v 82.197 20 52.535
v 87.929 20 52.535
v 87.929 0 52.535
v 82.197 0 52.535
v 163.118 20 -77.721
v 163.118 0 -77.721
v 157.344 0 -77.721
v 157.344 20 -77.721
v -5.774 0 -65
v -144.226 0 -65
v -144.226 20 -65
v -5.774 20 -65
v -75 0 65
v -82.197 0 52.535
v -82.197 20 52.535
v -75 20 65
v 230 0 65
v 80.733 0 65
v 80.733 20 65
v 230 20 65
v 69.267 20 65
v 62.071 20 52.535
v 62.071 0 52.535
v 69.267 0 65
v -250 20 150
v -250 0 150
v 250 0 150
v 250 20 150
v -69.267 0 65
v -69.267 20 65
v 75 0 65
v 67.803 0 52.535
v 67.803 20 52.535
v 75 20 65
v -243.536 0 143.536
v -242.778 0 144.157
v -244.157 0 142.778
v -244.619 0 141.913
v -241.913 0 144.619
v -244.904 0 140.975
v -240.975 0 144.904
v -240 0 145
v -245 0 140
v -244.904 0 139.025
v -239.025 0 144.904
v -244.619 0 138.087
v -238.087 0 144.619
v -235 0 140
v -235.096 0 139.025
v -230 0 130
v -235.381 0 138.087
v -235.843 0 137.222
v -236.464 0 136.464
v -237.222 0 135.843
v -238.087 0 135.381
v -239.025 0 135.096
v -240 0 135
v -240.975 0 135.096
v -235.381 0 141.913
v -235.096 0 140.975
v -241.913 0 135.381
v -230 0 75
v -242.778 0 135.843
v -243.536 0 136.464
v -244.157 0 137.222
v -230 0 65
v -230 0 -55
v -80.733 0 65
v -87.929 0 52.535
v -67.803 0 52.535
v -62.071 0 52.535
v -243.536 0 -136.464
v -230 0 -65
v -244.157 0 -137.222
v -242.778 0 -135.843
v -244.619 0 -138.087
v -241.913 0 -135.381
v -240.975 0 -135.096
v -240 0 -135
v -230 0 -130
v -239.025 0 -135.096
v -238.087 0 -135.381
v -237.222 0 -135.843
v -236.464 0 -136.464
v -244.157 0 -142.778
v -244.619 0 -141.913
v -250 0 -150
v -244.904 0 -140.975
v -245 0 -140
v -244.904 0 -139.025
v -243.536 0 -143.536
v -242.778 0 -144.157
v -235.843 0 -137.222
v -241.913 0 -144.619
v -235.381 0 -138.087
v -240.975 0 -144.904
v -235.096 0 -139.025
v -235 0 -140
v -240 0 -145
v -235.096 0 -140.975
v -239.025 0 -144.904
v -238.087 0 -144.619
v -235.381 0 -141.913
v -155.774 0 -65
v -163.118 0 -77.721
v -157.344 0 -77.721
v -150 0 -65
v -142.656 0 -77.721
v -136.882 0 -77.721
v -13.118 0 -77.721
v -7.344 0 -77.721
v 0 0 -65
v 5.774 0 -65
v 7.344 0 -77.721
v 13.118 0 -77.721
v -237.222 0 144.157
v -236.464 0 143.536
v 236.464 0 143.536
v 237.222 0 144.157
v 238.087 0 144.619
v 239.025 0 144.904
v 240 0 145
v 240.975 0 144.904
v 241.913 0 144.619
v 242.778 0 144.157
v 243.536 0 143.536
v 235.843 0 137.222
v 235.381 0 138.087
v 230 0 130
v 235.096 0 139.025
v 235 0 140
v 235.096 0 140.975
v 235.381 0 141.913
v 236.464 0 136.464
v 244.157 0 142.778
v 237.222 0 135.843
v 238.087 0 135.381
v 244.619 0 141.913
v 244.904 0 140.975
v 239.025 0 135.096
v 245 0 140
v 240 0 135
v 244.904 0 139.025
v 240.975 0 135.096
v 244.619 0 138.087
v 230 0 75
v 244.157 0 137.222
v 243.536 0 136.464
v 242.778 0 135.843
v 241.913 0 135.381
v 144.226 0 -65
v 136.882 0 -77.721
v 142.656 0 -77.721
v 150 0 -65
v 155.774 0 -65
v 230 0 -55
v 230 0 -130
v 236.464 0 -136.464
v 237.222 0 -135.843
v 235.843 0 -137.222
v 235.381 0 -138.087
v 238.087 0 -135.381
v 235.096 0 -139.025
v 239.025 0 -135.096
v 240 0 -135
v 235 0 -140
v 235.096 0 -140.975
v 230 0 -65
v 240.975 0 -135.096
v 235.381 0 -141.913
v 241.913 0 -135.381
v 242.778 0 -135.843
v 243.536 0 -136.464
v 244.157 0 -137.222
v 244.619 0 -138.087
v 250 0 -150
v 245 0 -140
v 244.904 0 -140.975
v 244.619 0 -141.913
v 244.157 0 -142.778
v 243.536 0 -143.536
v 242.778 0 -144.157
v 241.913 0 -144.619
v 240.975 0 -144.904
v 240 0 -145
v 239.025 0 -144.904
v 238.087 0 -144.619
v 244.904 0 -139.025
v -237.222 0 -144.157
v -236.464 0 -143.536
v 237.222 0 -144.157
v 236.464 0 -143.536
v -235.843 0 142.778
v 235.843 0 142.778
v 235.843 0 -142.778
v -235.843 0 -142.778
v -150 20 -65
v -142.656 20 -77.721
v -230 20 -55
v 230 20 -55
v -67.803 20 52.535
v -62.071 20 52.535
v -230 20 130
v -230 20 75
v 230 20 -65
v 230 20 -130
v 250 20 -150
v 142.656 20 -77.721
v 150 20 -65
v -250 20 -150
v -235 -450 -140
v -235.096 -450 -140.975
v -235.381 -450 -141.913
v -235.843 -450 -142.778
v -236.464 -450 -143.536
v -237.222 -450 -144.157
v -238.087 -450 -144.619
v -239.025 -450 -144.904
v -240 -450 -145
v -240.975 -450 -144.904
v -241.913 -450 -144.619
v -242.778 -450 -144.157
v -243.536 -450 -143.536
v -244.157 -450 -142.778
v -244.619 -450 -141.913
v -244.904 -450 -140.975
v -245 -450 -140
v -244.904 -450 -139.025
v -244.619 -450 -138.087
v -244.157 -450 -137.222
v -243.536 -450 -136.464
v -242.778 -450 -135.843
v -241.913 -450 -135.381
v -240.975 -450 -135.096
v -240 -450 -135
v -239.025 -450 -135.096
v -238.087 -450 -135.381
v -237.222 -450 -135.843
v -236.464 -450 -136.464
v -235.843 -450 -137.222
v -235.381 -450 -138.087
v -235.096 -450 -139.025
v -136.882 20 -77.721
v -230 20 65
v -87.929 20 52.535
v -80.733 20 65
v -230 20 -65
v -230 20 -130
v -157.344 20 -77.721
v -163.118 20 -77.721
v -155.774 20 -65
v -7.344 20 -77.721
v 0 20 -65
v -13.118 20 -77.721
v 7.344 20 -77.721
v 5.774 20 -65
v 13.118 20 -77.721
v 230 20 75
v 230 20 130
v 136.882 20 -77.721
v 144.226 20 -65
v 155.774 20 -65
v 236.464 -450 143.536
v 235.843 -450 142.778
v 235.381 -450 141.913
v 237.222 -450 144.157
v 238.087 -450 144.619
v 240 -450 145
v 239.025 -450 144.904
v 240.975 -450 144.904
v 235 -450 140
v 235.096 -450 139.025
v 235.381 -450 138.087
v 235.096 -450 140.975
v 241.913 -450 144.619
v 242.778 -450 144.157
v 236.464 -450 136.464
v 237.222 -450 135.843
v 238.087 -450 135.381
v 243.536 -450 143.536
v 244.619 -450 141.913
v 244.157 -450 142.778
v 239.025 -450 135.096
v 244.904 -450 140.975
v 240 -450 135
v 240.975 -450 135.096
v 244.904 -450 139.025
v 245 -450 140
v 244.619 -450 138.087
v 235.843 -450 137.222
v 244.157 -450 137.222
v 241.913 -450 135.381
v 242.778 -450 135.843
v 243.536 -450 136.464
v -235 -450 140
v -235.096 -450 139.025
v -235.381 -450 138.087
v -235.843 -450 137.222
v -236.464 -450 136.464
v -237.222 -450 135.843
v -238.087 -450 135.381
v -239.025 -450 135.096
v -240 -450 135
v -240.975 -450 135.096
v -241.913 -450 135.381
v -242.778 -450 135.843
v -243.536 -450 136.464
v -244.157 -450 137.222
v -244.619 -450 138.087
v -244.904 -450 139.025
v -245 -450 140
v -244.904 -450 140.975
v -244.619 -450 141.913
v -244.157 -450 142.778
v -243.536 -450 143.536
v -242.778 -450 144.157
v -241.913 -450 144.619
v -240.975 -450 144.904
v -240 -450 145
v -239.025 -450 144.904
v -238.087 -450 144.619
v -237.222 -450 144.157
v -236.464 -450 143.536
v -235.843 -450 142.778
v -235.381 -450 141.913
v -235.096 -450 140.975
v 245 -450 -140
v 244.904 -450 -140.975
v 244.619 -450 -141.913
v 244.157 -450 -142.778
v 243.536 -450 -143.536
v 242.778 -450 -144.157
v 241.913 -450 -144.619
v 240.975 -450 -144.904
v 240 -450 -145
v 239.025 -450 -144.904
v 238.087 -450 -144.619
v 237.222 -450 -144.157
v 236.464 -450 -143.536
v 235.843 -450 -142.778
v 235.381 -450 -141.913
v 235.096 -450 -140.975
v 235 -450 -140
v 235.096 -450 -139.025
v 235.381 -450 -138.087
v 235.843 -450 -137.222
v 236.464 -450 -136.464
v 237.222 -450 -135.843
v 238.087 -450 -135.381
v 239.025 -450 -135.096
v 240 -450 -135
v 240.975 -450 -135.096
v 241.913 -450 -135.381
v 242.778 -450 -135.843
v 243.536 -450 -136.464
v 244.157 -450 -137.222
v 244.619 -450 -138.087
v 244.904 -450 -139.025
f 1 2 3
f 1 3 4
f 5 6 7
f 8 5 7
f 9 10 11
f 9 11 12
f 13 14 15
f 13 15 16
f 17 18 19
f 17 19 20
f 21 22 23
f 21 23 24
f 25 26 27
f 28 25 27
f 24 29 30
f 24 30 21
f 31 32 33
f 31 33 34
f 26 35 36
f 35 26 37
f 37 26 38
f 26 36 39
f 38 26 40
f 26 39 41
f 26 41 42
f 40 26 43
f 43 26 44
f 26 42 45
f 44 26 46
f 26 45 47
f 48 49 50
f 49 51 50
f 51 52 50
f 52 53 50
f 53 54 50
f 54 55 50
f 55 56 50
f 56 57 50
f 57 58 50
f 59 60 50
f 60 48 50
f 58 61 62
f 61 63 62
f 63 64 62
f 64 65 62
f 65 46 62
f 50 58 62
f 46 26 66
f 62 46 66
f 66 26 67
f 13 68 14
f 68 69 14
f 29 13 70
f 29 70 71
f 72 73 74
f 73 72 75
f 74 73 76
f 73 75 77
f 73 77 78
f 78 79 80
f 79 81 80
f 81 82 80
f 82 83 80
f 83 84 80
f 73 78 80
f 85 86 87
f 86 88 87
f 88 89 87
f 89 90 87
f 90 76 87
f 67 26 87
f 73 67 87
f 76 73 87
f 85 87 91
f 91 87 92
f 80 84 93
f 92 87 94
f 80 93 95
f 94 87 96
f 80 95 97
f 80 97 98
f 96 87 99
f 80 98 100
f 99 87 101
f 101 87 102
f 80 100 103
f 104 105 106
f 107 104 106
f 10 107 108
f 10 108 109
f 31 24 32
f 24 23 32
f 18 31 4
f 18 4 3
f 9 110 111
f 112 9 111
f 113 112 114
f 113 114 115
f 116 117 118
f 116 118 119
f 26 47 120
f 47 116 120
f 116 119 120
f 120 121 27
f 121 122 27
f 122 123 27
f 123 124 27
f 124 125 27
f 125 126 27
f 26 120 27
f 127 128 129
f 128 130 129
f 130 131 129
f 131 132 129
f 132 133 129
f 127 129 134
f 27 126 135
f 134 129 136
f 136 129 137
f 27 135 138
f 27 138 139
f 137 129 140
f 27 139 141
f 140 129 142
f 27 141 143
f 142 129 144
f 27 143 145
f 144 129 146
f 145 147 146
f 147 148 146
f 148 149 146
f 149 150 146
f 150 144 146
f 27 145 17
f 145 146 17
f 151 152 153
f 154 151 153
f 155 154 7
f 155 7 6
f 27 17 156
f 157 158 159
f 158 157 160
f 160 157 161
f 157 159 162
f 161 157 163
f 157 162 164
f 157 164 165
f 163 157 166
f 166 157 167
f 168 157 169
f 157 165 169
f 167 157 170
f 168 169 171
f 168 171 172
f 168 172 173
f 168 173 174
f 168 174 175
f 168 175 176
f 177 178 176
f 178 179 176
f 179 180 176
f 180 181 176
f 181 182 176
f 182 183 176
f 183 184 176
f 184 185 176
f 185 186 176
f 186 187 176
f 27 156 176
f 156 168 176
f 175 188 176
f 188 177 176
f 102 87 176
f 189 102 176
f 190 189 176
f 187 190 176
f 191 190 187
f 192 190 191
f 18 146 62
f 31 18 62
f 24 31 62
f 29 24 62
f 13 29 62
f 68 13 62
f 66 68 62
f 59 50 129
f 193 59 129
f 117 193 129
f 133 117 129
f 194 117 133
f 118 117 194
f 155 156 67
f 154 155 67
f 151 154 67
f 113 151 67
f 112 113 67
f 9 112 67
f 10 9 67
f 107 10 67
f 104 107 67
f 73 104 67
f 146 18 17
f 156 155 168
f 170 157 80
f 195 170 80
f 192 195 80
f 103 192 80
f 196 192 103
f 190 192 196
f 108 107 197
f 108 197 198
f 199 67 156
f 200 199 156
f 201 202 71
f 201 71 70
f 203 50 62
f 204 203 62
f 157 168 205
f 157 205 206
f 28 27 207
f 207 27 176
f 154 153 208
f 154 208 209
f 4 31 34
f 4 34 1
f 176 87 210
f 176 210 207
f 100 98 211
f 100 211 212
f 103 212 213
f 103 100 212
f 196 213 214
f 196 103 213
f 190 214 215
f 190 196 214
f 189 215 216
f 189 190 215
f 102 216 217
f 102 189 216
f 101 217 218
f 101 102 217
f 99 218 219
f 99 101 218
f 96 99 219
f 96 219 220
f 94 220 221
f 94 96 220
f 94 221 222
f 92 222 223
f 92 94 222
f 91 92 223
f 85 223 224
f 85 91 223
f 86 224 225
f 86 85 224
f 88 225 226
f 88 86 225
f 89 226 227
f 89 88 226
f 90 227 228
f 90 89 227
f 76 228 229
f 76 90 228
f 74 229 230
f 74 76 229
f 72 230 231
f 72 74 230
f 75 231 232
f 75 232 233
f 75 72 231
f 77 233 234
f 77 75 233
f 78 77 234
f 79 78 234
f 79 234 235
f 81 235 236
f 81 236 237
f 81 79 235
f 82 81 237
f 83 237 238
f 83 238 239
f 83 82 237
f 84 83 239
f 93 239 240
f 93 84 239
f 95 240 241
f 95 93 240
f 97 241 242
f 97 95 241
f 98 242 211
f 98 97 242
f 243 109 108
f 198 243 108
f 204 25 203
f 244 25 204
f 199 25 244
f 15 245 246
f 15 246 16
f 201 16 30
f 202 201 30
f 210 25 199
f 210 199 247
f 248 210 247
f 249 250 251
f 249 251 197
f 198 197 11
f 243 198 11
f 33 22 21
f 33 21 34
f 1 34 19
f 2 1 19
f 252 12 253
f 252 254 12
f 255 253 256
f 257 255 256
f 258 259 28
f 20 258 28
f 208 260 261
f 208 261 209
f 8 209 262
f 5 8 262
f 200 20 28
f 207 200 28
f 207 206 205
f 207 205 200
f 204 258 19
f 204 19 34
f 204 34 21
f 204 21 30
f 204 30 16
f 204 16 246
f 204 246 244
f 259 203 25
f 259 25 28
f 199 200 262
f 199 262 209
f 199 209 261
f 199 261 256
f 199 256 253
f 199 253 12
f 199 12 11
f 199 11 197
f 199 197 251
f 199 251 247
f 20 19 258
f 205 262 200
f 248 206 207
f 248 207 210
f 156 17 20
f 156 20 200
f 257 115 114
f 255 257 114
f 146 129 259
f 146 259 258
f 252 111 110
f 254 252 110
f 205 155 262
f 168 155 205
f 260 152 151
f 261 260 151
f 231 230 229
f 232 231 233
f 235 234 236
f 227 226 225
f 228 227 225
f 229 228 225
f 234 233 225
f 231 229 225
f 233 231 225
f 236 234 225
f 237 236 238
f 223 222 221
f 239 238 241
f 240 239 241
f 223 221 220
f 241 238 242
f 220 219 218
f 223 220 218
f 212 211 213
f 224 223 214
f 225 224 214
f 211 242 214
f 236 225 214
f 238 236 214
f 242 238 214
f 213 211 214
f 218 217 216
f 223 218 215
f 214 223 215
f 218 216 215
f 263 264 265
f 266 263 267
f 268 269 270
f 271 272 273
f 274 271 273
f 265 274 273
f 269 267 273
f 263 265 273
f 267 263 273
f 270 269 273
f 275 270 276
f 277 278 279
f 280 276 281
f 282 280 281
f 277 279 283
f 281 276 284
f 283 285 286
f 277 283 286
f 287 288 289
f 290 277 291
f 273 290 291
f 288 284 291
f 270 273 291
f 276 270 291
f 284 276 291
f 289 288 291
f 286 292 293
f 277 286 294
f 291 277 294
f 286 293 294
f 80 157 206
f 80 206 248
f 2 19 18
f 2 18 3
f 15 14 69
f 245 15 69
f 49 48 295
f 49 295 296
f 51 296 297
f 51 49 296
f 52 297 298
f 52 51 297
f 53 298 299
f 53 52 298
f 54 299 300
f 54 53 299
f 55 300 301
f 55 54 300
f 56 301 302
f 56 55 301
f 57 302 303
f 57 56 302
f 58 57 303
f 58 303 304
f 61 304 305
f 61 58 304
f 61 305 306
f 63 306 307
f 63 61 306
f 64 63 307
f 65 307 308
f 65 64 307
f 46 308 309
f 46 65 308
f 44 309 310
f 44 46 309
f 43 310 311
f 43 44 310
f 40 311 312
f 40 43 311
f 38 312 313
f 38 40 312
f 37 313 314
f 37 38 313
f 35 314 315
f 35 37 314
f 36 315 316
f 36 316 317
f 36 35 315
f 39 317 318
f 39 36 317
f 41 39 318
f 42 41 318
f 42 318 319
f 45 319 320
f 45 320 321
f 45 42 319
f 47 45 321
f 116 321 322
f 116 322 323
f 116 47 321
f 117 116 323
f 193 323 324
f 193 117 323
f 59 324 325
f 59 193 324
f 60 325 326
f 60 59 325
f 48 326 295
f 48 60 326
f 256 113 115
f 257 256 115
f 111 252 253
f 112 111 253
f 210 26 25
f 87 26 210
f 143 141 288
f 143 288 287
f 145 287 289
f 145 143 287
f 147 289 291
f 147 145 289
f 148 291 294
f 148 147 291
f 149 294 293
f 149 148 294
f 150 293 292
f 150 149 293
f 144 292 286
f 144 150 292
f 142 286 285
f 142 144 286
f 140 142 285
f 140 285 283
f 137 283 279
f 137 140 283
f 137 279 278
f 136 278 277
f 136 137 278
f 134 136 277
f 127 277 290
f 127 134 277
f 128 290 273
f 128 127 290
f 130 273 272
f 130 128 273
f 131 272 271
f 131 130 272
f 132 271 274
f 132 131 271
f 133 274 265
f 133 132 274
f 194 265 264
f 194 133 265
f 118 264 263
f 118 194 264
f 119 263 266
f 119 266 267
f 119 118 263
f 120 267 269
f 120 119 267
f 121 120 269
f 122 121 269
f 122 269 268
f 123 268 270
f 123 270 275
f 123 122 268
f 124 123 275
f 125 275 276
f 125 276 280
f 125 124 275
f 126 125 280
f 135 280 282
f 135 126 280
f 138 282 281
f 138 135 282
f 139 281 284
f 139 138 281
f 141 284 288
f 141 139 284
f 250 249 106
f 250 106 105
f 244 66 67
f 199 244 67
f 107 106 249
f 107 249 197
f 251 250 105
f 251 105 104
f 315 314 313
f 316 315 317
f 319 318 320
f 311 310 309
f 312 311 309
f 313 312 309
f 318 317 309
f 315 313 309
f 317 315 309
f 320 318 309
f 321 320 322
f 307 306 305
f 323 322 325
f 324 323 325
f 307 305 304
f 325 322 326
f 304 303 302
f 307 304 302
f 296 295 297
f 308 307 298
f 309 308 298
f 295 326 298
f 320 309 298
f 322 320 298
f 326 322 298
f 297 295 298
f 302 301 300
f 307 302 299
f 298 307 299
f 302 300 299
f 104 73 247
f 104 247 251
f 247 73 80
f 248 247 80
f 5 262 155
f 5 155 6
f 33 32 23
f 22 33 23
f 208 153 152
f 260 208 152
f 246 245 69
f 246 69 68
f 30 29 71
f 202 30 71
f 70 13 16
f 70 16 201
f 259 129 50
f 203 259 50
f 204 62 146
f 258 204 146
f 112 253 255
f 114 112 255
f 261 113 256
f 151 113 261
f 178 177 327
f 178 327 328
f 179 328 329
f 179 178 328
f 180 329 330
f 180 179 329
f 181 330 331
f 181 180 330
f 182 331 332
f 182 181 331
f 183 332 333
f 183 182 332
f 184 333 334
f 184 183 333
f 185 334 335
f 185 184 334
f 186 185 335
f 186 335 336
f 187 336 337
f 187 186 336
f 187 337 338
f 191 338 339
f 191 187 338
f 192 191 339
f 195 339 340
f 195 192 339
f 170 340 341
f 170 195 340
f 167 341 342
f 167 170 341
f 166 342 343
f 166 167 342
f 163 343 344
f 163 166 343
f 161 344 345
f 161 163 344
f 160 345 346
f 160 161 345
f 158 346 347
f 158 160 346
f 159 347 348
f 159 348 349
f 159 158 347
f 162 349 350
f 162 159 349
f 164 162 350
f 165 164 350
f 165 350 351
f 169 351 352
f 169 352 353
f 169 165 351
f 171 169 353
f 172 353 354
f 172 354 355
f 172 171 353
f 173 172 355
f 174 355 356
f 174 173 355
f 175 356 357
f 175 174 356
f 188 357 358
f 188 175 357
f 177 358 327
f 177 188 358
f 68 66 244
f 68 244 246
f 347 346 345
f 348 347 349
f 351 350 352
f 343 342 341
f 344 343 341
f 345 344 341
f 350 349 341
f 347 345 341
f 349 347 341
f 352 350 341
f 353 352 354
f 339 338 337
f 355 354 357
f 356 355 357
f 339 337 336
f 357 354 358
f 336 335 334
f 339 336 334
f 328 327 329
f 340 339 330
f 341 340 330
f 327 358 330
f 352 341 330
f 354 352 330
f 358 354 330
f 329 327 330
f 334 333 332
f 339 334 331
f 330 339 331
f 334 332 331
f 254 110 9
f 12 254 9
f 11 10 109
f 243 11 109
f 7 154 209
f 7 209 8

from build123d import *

# Parameters (mm, degrees)
SKETCH2_W           = 500
SKETCH2_H           = 300
BOSS_EXTRUDE1_DEPTH = 20
SKETCH5_R           = 5
BOSS_EXTRUDE2_DEPTH = 450
SKETCH7_W           = 460
SKETCH7_H           = 260
CUT_EXTRUDE1_DEPTH  = 20
SKETCH8_W           = 500
SKETCH8_H           = 10
BOSS_EXTRUDE3_DEPTH = 20
BOSS_EXTRUDE8_DEPTH = 20
BOSS_EXTRUDE9_DEPTH = 20
CUT_EXTRUDE6_DEPTH  = 20


with BuildPart() as part:
    # Sketch2 → Boss-Extrude1 (new body)
    with BuildSketch(Plane(origin=(0, 0, 0), x_dir=(1, 0, 0), z_dir=(0, 1, 0))):
        Rectangle(SKETCH2_W, SKETCH2_H)
    extrude(amount=BOSS_EXTRUDE1_DEPTH)

    # Sketch5 → Boss-Extrude2 (add)
    with BuildSketch(Plane(origin=(0, 0, 0), x_dir=(1, 0, 0), z_dir=(0, 1, 0))):
        with Locations((-240, 140)):
            Circle(SKETCH5_R)
        with Locations((240, 140)):
            Circle(SKETCH5_R)
        with Locations((-240, -140)):
            Circle(SKETCH5_R)
        with Locations((240, -140)):
            Circle(SKETCH5_R)
    extrude(amount=-BOSS_EXTRUDE2_DEPTH)

    # Sketch7 → Cut-Extrude1 (cut)
    with BuildSketch(Plane(origin=(0, 0, 0), x_dir=(-1, 0, 0), z_dir=(0, -1, 0))):
        Rectangle(SKETCH7_W, SKETCH7_H)
    extrude(amount=-CUT_EXTRUDE1_DEPTH, mode=Mode.SUBTRACT)

    # Sketch8 → Boss-Extrude3 (add)
    with BuildSketch(Plane(origin=(0, 0, 0), x_dir=(1, 0, 0), z_dir=(0, 1, 0))):
        with Locations((0, 60)):
            Rectangle(SKETCH8_W, SKETCH8_H)
        with Locations((0, -70)):
            Rectangle(SKETCH8_W, SKETCH8_H)
    extrude(amount=BOSS_EXTRUDE3_DEPTH)

    # Sketch13 → Boss-Extrude8 (add)
    with BuildSketch(Plane(origin=(0, 20, 0), x_dir=(1, 0, 0), z_dir=(0, 1, 0))):
        Polygon((75, -74.929562993), (87.929380819, -52.535218504), (62.070619181, -52.535218504), align=None)
        Polygon((-75, -74.929562993), (-62.070619181, -52.535218504), (-87.929380819, -52.535218504), align=None)
    extrude(amount=-BOSS_EXTRUDE8_DEPTH)

    # Sketch9 → Boss-Extrude9 (add)
    with BuildSketch(Plane(origin=(0, 0, 0), x_dir=(1, 0, 0), z_dir=(0, 1, 0))):
        Polygon((-150, 55), (-136.882070442, 77.720920485), (-163.117929558, 77.720920485), align=None)
        Polygon((13.117929558, 77.720920485), (-13.117929558, 77.720920485), (0, 55), align=None)
        Polygon((163.117929558, 77.720920485), (136.882070442, 77.720920485), (150, 55), align=None)
    extrude(amount=BOSS_EXTRUDE9_DEPTH)

    # Sketch14 → Cut-Extrude6 (cut)
    with BuildSketch(Plane(origin=(0, 0, 0), x_dir=(1, 0, 0), z_dir=(0, 1, 0))):
        Polygon((-150, 65), (-138.983359701, 84.081380727), (-161.016640299, 84.081380727), align=None)
        Polygon((0, 65), (11.016640299, 84.081380727), (-11.016640299, 84.081380727), align=None)
        Polygon((150, 65), (161.016640299, 84.081380727), (138.983359701, 84.081380727), align=None)
        Polygon((75, -65), (85.794817429, -46.302827755), (64.205182571, -46.302827755), align=None)
        Polygon((-75, -65), (-64.205182571, -46.302827755), (-85.794817429, -46.302827755), align=None)
    extrude(amount=CUT_EXTRUDE6_DEPTH, mode=Mode.SUBTRACT)


solid = part.part
